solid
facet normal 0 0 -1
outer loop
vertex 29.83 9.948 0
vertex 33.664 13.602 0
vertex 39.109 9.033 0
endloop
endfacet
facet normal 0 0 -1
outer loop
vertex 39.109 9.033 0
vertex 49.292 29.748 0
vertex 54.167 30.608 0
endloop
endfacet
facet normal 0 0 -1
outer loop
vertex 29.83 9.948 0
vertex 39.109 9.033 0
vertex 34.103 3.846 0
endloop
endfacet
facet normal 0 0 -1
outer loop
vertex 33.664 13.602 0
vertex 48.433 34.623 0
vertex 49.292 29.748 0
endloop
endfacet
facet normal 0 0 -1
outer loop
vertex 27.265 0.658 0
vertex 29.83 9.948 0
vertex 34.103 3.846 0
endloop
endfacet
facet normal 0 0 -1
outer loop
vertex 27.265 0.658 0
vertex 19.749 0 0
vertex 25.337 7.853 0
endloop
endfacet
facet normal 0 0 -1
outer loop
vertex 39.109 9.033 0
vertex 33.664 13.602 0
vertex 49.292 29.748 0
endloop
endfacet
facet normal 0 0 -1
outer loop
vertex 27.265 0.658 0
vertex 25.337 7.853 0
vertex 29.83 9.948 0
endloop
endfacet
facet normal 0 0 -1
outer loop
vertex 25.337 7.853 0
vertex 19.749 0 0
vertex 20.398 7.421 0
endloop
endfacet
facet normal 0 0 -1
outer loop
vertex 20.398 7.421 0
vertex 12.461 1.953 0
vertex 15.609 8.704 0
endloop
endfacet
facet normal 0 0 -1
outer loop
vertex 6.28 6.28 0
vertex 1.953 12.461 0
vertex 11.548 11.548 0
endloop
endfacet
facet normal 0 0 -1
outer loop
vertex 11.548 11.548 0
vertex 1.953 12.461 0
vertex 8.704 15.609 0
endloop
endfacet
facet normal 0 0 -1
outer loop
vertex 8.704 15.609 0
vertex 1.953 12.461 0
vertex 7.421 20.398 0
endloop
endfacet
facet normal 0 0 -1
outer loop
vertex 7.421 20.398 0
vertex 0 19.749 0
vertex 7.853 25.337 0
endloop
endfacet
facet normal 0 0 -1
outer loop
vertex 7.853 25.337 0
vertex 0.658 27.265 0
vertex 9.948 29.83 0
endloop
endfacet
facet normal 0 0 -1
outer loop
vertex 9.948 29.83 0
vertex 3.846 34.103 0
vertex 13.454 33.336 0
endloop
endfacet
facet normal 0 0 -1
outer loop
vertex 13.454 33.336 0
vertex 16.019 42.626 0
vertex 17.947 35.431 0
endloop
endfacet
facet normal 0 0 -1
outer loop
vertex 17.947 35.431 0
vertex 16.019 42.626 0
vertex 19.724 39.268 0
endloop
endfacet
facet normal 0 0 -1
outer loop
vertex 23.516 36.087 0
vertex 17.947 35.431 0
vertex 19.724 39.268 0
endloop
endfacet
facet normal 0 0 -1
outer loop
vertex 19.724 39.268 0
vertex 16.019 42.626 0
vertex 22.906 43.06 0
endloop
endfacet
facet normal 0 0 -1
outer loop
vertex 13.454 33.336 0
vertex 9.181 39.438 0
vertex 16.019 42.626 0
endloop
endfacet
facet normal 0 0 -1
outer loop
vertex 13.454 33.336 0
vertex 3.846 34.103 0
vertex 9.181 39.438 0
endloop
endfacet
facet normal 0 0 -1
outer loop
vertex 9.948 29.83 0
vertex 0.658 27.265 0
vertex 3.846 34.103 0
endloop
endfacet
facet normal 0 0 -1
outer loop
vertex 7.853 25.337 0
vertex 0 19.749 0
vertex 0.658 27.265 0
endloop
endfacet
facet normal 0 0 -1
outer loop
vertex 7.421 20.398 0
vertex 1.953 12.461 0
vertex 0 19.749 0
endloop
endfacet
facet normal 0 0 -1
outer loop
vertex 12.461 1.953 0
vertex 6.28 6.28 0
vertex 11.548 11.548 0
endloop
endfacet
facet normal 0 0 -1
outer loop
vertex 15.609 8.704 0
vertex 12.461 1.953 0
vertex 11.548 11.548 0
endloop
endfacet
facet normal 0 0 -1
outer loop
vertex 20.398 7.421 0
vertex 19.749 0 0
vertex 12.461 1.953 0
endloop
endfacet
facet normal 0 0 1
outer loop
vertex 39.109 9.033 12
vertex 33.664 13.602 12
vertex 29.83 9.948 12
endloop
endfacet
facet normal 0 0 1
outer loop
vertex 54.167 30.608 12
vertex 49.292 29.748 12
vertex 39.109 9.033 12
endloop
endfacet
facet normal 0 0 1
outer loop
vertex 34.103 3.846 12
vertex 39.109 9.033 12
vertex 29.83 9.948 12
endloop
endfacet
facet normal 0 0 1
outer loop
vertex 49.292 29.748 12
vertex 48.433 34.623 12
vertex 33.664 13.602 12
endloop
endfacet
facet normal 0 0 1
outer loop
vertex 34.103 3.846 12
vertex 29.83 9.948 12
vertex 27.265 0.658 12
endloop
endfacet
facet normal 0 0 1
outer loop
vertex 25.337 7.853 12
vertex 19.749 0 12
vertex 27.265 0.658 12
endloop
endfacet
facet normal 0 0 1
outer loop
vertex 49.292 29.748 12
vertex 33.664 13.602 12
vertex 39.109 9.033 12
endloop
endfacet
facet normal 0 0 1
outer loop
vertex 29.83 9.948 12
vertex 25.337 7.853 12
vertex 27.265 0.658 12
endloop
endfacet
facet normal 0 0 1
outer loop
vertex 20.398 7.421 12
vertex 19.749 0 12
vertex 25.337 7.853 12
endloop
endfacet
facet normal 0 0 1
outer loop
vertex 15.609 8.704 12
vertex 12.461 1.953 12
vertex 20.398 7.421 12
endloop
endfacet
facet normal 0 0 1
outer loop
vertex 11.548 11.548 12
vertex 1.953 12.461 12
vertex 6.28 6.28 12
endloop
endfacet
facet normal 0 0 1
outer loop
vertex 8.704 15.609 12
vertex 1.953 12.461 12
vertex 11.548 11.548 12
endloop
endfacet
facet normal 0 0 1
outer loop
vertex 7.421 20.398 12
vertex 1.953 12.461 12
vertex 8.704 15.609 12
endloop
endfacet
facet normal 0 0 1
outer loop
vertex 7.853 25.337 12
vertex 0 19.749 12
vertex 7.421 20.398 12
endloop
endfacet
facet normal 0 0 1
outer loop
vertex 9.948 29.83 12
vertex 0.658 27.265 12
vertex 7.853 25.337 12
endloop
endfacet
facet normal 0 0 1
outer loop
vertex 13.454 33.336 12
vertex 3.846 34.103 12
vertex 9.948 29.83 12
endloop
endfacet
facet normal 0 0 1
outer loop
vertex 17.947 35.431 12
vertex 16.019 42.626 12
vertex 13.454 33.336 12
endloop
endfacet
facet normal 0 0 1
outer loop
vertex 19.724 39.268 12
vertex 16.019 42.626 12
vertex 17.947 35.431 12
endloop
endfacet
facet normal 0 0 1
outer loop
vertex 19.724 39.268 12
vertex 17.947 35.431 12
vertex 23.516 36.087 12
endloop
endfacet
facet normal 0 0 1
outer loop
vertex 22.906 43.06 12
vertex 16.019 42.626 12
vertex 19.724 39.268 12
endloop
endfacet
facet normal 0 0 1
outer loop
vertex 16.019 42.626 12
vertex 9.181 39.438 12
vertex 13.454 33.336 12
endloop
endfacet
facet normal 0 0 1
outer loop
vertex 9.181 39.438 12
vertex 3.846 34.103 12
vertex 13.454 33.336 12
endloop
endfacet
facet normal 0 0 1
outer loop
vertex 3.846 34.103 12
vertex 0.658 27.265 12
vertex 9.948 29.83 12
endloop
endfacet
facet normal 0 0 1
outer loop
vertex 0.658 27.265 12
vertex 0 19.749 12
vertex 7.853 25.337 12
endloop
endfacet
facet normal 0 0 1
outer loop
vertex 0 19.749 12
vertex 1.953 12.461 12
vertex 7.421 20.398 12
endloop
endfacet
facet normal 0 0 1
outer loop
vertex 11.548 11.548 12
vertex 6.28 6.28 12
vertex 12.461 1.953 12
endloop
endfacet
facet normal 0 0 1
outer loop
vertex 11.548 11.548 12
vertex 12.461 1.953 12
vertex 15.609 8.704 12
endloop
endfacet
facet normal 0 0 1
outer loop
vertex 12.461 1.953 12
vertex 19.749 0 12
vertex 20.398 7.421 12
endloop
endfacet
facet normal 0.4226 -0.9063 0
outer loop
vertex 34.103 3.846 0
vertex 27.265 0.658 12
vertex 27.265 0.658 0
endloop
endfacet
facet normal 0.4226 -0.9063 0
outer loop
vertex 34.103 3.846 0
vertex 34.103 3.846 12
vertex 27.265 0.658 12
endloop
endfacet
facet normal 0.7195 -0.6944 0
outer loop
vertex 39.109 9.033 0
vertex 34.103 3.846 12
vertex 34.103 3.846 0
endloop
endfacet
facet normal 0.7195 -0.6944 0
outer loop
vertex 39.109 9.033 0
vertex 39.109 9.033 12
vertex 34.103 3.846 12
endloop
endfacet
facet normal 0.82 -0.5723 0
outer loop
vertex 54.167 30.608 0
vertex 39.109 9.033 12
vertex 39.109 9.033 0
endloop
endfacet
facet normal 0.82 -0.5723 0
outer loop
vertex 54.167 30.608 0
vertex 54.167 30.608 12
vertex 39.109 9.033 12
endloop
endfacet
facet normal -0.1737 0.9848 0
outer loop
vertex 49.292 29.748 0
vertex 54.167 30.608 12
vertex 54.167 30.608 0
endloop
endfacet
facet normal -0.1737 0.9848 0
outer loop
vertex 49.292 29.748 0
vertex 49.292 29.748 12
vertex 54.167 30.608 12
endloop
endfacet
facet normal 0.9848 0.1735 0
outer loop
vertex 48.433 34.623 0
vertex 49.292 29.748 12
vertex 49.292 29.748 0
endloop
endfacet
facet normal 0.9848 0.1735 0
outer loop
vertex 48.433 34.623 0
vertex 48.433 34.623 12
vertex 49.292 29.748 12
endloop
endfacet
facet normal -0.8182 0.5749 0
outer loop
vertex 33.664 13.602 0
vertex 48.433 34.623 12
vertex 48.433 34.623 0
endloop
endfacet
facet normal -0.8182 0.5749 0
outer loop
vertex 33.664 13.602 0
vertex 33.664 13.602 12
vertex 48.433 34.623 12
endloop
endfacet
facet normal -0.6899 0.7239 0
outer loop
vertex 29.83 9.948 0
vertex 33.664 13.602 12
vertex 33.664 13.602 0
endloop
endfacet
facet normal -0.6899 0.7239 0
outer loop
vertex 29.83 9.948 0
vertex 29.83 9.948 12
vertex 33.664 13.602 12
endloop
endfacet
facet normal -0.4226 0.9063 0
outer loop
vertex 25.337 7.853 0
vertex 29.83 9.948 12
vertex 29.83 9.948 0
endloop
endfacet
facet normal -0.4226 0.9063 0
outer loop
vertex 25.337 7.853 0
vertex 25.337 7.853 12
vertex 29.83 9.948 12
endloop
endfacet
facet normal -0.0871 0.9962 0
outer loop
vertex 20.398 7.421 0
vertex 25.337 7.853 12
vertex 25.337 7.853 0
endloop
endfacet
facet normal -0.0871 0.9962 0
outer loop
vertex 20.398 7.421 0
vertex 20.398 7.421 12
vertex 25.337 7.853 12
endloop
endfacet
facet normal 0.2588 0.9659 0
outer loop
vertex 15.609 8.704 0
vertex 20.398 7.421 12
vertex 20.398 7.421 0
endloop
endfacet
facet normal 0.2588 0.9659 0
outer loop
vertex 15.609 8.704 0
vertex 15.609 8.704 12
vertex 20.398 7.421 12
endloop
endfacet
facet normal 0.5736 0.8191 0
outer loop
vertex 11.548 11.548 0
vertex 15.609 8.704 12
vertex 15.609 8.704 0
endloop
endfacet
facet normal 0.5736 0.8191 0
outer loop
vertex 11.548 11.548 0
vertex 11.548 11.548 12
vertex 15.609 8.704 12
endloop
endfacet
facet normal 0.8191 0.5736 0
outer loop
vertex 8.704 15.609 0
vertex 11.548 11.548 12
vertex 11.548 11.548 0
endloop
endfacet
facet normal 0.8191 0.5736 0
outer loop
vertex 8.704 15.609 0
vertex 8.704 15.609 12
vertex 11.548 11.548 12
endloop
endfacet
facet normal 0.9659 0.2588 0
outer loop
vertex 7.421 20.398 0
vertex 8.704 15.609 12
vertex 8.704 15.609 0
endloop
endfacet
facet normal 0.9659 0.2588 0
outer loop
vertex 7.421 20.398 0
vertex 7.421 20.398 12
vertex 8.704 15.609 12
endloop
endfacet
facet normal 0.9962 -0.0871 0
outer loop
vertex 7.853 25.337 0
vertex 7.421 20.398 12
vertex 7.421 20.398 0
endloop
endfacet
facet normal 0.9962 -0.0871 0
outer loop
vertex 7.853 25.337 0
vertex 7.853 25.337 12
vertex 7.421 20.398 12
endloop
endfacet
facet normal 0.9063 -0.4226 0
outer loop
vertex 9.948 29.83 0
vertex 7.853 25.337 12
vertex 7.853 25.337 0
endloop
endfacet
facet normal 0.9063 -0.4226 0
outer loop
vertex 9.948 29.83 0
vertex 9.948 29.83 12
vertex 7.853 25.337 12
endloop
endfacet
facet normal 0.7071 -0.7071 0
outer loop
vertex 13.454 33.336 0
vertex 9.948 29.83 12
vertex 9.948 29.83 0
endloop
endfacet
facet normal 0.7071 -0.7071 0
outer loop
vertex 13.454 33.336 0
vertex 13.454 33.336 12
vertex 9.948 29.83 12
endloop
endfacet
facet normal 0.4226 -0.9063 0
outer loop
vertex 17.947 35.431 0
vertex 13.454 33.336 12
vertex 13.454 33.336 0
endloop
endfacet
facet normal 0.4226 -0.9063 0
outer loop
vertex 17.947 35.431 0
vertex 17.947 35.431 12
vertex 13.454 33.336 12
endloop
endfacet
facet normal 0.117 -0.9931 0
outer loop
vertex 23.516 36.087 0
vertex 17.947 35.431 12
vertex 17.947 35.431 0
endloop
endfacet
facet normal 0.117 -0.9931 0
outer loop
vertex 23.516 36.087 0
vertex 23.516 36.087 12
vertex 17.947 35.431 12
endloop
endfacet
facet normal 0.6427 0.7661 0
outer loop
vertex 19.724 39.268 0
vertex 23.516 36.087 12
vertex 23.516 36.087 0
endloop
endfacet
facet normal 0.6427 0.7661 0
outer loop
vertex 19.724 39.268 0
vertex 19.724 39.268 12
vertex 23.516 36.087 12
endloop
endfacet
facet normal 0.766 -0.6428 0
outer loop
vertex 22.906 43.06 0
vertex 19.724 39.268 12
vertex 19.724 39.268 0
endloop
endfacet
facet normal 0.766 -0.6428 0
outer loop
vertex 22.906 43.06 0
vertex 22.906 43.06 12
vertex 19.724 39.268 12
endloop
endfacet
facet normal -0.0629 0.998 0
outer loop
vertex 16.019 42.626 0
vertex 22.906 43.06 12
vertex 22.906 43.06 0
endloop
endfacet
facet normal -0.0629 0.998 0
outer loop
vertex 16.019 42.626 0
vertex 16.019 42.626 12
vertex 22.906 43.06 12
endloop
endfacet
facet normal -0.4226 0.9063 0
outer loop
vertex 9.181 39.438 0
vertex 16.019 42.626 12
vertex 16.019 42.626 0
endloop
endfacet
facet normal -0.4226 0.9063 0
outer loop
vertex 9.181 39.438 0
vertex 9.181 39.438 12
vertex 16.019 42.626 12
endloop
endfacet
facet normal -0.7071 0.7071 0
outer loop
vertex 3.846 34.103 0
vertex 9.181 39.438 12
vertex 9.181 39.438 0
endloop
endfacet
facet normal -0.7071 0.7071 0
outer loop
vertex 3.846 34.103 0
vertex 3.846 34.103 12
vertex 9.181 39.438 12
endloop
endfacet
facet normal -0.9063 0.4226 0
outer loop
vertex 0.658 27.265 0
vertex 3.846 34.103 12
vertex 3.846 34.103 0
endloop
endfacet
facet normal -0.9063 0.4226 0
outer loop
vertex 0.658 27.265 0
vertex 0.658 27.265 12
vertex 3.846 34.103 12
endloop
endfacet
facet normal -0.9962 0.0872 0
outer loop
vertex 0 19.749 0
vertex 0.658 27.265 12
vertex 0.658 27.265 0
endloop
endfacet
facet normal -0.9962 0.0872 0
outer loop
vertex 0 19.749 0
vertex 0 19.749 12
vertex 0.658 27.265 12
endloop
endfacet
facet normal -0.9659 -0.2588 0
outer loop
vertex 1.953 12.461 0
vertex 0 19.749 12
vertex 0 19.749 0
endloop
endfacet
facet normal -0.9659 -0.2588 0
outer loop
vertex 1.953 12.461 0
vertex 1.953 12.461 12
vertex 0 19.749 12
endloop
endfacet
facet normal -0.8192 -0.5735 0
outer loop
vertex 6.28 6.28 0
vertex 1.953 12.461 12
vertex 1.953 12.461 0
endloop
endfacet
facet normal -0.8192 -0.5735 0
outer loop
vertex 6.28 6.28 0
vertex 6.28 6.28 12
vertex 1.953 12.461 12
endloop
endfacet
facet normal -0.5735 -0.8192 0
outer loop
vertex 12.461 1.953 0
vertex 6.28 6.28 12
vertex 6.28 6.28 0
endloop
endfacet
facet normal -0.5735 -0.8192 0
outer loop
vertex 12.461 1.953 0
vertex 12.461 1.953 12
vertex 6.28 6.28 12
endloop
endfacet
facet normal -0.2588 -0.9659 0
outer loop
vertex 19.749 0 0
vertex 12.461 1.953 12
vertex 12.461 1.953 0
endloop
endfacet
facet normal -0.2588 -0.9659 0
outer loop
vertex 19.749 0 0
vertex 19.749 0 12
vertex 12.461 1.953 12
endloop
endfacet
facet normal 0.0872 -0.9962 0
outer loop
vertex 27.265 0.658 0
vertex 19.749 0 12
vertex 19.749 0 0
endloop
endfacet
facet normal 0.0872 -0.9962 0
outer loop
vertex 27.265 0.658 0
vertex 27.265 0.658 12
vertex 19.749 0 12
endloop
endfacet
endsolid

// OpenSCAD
$fn = 32;

// ----------------------------------------------------------------------
// Eye lug: ring_tail, 12 mm thick
// ----------------------------------------------------------------------

// --- parameters (mm) ---
profile_height = 12;      // extrusion height
profile_points = 30;      // points of the closed outline

profile = [[19.724, 39.268], [22.906, 43.06], [16.019, 42.626], [9.181, 39.438], [3.846, 34.103], [0.658, 27.265], [0, 19.749], [1.953, 12.461], [6.28, 6.28], [12.461, 1.953], [19.749, 0], [27.265, 0.658], [34.103, 3.846], [39.109, 9.033], [54.167, 30.608], [49.292, 29.748], [48.433, 34.623], [33.664, 13.602], [29.83, 9.948], [25.337, 7.853], [20.398, 7.421], [15.609, 8.704], [11.548, 11.548], [8.704, 15.609], [7.421, 20.398], [7.853, 25.337], [9.948, 29.83], [13.454, 33.336], [17.947, 35.431], [23.516, 36.087]];  // single closed polygon, 30 points, counter clockwise

// --- the one profile operation ---
linear_extrude(height = profile_height) polygon(points = profile);
